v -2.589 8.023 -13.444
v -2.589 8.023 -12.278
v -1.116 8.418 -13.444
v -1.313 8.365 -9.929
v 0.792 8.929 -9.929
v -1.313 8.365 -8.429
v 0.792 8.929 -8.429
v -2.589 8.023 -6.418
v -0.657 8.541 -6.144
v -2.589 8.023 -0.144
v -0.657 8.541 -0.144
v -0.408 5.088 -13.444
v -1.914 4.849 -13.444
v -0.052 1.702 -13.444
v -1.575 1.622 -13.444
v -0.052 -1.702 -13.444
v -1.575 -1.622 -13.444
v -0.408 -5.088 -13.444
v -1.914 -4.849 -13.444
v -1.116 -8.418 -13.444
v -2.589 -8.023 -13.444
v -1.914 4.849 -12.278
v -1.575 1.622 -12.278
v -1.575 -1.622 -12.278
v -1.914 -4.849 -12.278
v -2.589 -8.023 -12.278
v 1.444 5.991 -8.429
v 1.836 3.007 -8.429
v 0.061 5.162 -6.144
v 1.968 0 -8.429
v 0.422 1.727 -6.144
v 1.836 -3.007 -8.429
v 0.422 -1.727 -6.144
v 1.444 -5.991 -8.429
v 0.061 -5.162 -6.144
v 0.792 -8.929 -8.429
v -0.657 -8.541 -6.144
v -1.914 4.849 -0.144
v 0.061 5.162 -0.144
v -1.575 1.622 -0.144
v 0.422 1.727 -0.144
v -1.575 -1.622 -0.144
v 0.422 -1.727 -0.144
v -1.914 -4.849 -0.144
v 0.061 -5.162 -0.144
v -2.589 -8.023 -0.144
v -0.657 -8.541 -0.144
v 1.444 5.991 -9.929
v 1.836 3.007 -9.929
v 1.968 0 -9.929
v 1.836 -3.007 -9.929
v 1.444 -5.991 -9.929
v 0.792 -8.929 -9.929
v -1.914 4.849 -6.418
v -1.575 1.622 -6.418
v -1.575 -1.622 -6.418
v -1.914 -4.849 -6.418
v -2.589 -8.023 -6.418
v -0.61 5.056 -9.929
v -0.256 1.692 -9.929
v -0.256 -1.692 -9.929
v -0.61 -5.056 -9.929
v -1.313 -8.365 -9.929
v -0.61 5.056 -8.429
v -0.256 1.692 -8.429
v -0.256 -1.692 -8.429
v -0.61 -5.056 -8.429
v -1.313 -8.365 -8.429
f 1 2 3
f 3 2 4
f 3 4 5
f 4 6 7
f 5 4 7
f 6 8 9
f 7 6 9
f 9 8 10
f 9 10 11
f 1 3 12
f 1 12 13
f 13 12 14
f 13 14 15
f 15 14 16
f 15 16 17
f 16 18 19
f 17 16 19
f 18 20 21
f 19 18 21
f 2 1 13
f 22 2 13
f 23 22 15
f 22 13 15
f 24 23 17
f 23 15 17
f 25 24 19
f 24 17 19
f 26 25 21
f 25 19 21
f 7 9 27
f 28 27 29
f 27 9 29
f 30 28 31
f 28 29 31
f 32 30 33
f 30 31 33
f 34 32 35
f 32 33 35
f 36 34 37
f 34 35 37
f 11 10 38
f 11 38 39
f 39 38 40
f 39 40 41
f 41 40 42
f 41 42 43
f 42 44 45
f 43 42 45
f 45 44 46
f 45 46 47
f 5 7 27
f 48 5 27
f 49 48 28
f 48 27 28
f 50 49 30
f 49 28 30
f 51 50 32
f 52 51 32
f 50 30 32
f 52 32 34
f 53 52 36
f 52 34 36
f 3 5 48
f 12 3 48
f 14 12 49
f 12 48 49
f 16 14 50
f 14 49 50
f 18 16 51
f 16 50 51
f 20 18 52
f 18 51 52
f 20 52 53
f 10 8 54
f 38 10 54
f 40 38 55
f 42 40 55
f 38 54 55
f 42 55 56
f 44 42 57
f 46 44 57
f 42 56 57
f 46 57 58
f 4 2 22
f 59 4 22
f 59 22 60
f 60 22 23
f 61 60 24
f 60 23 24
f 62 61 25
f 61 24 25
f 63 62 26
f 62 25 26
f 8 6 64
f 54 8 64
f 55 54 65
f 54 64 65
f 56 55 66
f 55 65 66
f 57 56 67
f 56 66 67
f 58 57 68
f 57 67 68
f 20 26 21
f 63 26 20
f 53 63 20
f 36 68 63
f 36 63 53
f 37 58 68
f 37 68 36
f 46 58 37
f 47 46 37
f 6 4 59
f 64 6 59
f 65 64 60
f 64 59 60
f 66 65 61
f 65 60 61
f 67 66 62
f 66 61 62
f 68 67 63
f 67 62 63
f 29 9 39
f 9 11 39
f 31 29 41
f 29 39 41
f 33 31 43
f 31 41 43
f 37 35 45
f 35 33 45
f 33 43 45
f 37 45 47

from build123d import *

# Parameters (mm, degrees)
F1_ANGLE = 30


with BuildPart() as f1:
    # F0 (on Front) → F1 (revolve, symmetric)
    with BuildSketch(Plane.XZ) as f1_sk:
        Polygon((0.467722, -0.143643), (-1.532278, -0.143643), (-1.532278, -6.143643), (-1.532278, -6.417708), (-0.212138, -8.429299), (-0.212138, -9.929299), (-1.532278, -12.27802), (-1.532278, -13.443643), (-0.007577, -13.443643), (1.967722, -9.929299), (1.967722, -8.429299), (0.467722, -6.143643), align=None)
    revolve(axis=Axis((-32.532278, 0, -1.684785), (0, 0, 1)), revolution_arc=F1_ANGLE / 2)
    revolve(f1_sk.sketch, axis=Axis((-32.532278, 0, -1.684785), (0, 0, -1)), revolution_arc=F1_ANGLE / 2)


solid = f1.part
